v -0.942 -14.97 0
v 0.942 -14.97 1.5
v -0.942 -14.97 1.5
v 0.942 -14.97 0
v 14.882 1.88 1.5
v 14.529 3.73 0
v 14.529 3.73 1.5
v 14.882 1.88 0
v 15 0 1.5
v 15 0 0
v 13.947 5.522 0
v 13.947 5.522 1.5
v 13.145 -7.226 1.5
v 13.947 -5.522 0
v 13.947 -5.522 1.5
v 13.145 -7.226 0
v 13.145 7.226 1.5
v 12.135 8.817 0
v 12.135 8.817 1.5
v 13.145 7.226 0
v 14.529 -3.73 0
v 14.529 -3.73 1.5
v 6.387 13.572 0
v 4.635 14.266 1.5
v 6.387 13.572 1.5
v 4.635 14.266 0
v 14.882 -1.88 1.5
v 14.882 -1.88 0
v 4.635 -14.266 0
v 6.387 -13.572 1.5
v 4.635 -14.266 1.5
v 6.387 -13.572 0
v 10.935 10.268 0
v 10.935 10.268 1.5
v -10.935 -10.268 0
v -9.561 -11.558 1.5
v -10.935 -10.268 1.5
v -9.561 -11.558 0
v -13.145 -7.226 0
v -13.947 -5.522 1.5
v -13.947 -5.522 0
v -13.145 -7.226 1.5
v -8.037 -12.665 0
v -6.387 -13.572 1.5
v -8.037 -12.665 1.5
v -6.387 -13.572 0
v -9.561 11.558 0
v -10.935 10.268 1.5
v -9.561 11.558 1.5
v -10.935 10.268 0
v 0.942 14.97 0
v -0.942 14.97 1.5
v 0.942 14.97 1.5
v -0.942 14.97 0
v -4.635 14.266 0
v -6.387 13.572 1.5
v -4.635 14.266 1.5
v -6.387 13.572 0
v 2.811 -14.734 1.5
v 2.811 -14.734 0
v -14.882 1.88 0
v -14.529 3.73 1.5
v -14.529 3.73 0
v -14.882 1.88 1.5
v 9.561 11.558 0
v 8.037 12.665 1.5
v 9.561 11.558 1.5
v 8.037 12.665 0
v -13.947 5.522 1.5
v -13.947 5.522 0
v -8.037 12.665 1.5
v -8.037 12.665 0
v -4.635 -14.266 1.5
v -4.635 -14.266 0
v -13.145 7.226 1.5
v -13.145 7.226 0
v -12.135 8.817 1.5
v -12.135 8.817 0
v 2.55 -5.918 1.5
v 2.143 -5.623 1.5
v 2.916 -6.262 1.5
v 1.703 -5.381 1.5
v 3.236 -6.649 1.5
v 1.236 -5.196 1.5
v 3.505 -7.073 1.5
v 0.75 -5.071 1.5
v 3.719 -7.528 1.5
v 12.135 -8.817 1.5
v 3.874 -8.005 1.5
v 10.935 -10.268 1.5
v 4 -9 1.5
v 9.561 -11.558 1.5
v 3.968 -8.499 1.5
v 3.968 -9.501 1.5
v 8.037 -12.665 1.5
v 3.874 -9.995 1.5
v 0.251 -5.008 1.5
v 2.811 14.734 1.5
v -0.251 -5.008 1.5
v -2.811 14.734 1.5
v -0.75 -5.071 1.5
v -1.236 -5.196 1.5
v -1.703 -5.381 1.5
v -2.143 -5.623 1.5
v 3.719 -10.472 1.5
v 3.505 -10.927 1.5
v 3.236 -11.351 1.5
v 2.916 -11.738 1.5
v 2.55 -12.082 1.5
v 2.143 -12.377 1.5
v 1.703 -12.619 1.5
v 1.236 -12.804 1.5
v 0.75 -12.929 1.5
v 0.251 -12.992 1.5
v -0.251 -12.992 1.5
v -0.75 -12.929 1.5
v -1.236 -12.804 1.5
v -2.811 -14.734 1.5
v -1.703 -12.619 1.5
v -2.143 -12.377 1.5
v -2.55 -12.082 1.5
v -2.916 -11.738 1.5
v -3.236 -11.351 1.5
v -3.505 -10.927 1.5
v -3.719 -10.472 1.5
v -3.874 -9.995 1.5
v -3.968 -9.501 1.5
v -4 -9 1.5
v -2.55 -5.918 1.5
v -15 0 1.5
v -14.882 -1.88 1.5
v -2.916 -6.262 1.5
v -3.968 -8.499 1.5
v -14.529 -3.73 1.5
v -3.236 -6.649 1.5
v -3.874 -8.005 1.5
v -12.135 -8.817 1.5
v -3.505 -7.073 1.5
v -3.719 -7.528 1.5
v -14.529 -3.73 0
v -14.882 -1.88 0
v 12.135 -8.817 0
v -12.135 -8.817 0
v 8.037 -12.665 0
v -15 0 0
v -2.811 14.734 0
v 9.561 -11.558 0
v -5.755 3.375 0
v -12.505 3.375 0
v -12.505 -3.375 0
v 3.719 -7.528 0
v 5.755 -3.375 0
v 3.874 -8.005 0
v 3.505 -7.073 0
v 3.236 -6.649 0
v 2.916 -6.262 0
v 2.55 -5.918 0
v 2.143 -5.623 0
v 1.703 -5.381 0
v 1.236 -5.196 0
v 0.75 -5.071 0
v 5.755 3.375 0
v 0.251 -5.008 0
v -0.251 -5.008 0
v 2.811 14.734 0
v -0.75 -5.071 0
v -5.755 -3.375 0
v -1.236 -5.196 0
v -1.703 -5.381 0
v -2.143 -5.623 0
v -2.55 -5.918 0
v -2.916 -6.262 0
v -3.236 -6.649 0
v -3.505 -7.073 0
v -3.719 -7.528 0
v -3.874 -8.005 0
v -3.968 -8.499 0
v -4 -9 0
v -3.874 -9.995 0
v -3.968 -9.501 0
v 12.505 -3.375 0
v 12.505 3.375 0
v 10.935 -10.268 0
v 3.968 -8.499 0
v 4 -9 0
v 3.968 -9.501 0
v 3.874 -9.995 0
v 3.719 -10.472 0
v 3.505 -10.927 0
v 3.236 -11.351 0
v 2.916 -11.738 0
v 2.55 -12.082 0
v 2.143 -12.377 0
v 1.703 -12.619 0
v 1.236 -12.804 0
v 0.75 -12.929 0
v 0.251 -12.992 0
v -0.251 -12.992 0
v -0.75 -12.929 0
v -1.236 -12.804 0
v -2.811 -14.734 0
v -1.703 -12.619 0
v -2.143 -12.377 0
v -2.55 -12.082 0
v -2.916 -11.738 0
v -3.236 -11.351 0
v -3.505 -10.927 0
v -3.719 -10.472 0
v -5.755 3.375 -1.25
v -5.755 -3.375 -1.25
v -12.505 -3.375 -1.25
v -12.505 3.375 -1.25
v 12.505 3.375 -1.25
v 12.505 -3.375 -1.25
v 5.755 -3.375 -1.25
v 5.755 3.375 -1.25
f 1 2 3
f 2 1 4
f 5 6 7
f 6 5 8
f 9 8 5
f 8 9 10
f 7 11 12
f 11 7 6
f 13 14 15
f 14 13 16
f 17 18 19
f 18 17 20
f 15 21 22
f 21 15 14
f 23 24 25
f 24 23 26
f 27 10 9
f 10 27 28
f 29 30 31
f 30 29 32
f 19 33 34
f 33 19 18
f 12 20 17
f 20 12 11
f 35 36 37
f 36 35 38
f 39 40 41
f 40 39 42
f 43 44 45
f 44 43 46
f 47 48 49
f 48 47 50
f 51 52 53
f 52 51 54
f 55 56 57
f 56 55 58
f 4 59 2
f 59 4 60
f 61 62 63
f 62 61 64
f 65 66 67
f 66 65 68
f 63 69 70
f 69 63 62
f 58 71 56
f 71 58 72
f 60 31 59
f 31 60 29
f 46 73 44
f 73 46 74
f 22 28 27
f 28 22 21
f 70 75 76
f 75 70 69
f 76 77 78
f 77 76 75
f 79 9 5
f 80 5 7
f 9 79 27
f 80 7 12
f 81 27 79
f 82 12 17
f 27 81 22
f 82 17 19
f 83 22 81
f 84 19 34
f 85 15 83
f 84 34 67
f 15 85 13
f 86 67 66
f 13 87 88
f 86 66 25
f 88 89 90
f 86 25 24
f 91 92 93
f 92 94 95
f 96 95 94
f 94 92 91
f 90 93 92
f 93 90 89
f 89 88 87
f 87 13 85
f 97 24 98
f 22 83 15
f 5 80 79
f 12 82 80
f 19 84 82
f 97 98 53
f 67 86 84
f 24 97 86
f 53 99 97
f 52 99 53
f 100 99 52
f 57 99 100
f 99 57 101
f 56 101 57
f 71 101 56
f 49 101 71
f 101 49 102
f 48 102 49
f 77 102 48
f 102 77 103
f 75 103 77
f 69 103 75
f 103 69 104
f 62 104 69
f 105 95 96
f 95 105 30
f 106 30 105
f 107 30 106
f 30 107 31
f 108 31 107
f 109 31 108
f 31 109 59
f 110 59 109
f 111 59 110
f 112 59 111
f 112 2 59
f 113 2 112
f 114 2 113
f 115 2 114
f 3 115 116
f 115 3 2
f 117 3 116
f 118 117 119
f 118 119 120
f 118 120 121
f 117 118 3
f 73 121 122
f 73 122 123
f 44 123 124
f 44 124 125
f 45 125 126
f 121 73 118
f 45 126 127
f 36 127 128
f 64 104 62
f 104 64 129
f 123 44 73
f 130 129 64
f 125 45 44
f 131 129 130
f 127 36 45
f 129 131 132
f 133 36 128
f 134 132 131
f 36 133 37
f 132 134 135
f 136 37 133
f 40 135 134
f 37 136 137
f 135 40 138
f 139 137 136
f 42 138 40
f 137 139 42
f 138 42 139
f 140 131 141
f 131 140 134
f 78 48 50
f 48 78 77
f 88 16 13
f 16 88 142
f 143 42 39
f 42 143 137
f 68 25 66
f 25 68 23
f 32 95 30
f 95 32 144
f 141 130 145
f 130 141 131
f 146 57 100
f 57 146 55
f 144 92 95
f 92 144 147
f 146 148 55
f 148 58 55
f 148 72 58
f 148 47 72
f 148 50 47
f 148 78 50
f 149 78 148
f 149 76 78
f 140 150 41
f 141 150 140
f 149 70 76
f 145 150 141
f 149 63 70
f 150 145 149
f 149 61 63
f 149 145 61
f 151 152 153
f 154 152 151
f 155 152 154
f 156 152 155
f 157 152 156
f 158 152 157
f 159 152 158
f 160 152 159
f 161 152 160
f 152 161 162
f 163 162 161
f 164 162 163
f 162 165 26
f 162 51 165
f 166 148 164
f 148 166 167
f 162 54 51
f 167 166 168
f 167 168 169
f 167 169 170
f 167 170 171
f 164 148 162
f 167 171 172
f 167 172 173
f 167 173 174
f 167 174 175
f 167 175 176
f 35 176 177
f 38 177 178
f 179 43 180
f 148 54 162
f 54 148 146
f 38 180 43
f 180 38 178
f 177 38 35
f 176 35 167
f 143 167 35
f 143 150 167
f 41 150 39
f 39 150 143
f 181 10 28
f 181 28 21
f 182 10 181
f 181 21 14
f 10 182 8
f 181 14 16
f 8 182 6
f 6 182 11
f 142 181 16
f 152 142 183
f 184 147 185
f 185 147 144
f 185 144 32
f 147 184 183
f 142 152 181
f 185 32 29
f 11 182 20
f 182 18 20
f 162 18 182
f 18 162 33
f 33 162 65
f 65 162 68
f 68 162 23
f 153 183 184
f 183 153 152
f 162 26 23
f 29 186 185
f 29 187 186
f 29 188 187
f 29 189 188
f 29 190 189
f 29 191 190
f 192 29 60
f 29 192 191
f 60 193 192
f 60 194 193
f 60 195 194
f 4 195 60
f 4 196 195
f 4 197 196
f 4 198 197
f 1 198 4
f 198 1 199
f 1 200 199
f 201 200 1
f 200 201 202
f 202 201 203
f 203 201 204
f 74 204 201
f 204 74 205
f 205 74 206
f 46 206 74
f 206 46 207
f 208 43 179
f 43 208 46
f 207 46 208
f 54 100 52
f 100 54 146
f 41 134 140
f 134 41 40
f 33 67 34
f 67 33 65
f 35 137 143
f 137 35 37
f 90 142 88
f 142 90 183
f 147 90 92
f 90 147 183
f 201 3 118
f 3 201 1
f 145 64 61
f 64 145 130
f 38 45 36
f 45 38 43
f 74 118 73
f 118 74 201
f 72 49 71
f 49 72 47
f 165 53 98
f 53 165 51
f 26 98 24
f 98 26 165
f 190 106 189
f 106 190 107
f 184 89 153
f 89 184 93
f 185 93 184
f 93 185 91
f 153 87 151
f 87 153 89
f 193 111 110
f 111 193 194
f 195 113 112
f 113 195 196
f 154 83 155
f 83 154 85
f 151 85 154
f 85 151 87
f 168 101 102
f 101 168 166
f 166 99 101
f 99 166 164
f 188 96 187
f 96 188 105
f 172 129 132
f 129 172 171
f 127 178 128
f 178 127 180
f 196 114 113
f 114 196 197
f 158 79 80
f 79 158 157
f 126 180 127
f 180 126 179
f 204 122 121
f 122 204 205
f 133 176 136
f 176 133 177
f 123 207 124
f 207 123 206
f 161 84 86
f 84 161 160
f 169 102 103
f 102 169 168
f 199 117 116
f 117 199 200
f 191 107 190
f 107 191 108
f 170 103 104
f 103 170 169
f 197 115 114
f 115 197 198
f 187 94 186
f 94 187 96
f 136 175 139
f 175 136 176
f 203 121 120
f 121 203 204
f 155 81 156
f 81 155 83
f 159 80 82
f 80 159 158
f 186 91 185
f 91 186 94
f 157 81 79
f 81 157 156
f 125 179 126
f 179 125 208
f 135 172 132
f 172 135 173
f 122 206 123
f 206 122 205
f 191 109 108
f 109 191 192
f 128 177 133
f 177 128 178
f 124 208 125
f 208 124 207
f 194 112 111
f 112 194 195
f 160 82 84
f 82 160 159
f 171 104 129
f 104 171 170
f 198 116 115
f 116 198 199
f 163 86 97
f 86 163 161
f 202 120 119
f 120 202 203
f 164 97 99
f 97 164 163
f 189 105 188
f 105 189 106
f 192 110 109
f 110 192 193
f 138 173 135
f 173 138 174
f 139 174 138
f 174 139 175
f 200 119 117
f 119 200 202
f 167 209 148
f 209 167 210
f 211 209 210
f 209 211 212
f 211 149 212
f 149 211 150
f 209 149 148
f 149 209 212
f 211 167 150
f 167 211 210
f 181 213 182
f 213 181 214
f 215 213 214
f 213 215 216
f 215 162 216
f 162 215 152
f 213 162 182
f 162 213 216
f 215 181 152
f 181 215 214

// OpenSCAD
$fn = 50;

key_x = 9.1;
key_y = 19.5;
key_z = 2.6;
key_cut_d = 4.5;
key_cut_dist = 7.5;

handle_d = 30;
handle_z = 1.5;
handle_1_z = key_z + handle_z;
handle_2_z = handle_z;

block_base = 0.25 * handle_d;
block_diff = 0.1;
block_base_z = key_z;

hole_d = 8;
hole_margin = 2;

module key() {
  difference() {
    cube([key_x, key_y, key_z]);
    translate([0, key_cut_dist, 0]) cylinder(d=key_cut_d, h=key_z);
    translate([key_x, key_cut_dist, 0]) cylinder(d=key_cut_d, h=key_z);
  }
}

module handle_1() {
  offset_y = 0.5*handle_d - key_y;
    
  difference() {
    cylinder(d=handle_d, h=handle_1_z);
    translate([-0.5*key_x, offset_y, 0]) key();
    block_edge = block_base*(1+block_diff);
    translate([-0.55*(key_x+block_base), 0, 0]) cube([block_edge, block_edge, block_base_z+3*block_diff], center=true);
    translate([0.55*(key_x+block_base), 0, 0]) cube([block_edge, block_edge, block_base_z+3*block_diff], center=true);
    //translate([0, -block_edge, 0]) cube([block_edge, block_edge, block_z], center=true);
    hole_offset = -0.5*(handle_d - hole_d) + hole_margin;
    translate([0, hole_offset, 0]) cylinder(d=hole_d, h=2*handle_1_z);
  }  
}

module handle_2() {
  difference() {
    cylinder(d=handle_d, h=handle_2_z);
    hole_offset = -0.5*(handle_d - hole_d) + hole_margin;
    translate([0, hole_offset, 0]) cylinder(d=hole_d, h=2*handle_1_z);
  }
  block_edge = block_base*(1-block_diff);
  translate([-0.55*(key_x+block_base), 0, 0]) cube([block_edge, block_edge, block_base_z-block_diff], center=true);
  translate([0.55*(key_x+block_base), 0, 0]) cube([block_edge, block_edge, block_base_z-block_diff], center=true);
  //translate([0, -block_edge, 0]) cube([block_edge, block_edge, block_z], center=true); 
}

//key();
//handle_1();
//rotate([0, 180, 0]) translate([0, 0, 10]) 
handle_2();
